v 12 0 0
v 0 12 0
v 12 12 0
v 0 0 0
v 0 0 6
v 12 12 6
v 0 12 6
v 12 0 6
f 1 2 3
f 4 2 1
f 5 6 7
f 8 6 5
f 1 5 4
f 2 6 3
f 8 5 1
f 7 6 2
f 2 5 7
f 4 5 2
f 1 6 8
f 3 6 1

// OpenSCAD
// Minkowski of two boxes = a box of summed dimensions (exact, convex operands).
minkowski() { cube([10, 10, 4]); cube(2); }
